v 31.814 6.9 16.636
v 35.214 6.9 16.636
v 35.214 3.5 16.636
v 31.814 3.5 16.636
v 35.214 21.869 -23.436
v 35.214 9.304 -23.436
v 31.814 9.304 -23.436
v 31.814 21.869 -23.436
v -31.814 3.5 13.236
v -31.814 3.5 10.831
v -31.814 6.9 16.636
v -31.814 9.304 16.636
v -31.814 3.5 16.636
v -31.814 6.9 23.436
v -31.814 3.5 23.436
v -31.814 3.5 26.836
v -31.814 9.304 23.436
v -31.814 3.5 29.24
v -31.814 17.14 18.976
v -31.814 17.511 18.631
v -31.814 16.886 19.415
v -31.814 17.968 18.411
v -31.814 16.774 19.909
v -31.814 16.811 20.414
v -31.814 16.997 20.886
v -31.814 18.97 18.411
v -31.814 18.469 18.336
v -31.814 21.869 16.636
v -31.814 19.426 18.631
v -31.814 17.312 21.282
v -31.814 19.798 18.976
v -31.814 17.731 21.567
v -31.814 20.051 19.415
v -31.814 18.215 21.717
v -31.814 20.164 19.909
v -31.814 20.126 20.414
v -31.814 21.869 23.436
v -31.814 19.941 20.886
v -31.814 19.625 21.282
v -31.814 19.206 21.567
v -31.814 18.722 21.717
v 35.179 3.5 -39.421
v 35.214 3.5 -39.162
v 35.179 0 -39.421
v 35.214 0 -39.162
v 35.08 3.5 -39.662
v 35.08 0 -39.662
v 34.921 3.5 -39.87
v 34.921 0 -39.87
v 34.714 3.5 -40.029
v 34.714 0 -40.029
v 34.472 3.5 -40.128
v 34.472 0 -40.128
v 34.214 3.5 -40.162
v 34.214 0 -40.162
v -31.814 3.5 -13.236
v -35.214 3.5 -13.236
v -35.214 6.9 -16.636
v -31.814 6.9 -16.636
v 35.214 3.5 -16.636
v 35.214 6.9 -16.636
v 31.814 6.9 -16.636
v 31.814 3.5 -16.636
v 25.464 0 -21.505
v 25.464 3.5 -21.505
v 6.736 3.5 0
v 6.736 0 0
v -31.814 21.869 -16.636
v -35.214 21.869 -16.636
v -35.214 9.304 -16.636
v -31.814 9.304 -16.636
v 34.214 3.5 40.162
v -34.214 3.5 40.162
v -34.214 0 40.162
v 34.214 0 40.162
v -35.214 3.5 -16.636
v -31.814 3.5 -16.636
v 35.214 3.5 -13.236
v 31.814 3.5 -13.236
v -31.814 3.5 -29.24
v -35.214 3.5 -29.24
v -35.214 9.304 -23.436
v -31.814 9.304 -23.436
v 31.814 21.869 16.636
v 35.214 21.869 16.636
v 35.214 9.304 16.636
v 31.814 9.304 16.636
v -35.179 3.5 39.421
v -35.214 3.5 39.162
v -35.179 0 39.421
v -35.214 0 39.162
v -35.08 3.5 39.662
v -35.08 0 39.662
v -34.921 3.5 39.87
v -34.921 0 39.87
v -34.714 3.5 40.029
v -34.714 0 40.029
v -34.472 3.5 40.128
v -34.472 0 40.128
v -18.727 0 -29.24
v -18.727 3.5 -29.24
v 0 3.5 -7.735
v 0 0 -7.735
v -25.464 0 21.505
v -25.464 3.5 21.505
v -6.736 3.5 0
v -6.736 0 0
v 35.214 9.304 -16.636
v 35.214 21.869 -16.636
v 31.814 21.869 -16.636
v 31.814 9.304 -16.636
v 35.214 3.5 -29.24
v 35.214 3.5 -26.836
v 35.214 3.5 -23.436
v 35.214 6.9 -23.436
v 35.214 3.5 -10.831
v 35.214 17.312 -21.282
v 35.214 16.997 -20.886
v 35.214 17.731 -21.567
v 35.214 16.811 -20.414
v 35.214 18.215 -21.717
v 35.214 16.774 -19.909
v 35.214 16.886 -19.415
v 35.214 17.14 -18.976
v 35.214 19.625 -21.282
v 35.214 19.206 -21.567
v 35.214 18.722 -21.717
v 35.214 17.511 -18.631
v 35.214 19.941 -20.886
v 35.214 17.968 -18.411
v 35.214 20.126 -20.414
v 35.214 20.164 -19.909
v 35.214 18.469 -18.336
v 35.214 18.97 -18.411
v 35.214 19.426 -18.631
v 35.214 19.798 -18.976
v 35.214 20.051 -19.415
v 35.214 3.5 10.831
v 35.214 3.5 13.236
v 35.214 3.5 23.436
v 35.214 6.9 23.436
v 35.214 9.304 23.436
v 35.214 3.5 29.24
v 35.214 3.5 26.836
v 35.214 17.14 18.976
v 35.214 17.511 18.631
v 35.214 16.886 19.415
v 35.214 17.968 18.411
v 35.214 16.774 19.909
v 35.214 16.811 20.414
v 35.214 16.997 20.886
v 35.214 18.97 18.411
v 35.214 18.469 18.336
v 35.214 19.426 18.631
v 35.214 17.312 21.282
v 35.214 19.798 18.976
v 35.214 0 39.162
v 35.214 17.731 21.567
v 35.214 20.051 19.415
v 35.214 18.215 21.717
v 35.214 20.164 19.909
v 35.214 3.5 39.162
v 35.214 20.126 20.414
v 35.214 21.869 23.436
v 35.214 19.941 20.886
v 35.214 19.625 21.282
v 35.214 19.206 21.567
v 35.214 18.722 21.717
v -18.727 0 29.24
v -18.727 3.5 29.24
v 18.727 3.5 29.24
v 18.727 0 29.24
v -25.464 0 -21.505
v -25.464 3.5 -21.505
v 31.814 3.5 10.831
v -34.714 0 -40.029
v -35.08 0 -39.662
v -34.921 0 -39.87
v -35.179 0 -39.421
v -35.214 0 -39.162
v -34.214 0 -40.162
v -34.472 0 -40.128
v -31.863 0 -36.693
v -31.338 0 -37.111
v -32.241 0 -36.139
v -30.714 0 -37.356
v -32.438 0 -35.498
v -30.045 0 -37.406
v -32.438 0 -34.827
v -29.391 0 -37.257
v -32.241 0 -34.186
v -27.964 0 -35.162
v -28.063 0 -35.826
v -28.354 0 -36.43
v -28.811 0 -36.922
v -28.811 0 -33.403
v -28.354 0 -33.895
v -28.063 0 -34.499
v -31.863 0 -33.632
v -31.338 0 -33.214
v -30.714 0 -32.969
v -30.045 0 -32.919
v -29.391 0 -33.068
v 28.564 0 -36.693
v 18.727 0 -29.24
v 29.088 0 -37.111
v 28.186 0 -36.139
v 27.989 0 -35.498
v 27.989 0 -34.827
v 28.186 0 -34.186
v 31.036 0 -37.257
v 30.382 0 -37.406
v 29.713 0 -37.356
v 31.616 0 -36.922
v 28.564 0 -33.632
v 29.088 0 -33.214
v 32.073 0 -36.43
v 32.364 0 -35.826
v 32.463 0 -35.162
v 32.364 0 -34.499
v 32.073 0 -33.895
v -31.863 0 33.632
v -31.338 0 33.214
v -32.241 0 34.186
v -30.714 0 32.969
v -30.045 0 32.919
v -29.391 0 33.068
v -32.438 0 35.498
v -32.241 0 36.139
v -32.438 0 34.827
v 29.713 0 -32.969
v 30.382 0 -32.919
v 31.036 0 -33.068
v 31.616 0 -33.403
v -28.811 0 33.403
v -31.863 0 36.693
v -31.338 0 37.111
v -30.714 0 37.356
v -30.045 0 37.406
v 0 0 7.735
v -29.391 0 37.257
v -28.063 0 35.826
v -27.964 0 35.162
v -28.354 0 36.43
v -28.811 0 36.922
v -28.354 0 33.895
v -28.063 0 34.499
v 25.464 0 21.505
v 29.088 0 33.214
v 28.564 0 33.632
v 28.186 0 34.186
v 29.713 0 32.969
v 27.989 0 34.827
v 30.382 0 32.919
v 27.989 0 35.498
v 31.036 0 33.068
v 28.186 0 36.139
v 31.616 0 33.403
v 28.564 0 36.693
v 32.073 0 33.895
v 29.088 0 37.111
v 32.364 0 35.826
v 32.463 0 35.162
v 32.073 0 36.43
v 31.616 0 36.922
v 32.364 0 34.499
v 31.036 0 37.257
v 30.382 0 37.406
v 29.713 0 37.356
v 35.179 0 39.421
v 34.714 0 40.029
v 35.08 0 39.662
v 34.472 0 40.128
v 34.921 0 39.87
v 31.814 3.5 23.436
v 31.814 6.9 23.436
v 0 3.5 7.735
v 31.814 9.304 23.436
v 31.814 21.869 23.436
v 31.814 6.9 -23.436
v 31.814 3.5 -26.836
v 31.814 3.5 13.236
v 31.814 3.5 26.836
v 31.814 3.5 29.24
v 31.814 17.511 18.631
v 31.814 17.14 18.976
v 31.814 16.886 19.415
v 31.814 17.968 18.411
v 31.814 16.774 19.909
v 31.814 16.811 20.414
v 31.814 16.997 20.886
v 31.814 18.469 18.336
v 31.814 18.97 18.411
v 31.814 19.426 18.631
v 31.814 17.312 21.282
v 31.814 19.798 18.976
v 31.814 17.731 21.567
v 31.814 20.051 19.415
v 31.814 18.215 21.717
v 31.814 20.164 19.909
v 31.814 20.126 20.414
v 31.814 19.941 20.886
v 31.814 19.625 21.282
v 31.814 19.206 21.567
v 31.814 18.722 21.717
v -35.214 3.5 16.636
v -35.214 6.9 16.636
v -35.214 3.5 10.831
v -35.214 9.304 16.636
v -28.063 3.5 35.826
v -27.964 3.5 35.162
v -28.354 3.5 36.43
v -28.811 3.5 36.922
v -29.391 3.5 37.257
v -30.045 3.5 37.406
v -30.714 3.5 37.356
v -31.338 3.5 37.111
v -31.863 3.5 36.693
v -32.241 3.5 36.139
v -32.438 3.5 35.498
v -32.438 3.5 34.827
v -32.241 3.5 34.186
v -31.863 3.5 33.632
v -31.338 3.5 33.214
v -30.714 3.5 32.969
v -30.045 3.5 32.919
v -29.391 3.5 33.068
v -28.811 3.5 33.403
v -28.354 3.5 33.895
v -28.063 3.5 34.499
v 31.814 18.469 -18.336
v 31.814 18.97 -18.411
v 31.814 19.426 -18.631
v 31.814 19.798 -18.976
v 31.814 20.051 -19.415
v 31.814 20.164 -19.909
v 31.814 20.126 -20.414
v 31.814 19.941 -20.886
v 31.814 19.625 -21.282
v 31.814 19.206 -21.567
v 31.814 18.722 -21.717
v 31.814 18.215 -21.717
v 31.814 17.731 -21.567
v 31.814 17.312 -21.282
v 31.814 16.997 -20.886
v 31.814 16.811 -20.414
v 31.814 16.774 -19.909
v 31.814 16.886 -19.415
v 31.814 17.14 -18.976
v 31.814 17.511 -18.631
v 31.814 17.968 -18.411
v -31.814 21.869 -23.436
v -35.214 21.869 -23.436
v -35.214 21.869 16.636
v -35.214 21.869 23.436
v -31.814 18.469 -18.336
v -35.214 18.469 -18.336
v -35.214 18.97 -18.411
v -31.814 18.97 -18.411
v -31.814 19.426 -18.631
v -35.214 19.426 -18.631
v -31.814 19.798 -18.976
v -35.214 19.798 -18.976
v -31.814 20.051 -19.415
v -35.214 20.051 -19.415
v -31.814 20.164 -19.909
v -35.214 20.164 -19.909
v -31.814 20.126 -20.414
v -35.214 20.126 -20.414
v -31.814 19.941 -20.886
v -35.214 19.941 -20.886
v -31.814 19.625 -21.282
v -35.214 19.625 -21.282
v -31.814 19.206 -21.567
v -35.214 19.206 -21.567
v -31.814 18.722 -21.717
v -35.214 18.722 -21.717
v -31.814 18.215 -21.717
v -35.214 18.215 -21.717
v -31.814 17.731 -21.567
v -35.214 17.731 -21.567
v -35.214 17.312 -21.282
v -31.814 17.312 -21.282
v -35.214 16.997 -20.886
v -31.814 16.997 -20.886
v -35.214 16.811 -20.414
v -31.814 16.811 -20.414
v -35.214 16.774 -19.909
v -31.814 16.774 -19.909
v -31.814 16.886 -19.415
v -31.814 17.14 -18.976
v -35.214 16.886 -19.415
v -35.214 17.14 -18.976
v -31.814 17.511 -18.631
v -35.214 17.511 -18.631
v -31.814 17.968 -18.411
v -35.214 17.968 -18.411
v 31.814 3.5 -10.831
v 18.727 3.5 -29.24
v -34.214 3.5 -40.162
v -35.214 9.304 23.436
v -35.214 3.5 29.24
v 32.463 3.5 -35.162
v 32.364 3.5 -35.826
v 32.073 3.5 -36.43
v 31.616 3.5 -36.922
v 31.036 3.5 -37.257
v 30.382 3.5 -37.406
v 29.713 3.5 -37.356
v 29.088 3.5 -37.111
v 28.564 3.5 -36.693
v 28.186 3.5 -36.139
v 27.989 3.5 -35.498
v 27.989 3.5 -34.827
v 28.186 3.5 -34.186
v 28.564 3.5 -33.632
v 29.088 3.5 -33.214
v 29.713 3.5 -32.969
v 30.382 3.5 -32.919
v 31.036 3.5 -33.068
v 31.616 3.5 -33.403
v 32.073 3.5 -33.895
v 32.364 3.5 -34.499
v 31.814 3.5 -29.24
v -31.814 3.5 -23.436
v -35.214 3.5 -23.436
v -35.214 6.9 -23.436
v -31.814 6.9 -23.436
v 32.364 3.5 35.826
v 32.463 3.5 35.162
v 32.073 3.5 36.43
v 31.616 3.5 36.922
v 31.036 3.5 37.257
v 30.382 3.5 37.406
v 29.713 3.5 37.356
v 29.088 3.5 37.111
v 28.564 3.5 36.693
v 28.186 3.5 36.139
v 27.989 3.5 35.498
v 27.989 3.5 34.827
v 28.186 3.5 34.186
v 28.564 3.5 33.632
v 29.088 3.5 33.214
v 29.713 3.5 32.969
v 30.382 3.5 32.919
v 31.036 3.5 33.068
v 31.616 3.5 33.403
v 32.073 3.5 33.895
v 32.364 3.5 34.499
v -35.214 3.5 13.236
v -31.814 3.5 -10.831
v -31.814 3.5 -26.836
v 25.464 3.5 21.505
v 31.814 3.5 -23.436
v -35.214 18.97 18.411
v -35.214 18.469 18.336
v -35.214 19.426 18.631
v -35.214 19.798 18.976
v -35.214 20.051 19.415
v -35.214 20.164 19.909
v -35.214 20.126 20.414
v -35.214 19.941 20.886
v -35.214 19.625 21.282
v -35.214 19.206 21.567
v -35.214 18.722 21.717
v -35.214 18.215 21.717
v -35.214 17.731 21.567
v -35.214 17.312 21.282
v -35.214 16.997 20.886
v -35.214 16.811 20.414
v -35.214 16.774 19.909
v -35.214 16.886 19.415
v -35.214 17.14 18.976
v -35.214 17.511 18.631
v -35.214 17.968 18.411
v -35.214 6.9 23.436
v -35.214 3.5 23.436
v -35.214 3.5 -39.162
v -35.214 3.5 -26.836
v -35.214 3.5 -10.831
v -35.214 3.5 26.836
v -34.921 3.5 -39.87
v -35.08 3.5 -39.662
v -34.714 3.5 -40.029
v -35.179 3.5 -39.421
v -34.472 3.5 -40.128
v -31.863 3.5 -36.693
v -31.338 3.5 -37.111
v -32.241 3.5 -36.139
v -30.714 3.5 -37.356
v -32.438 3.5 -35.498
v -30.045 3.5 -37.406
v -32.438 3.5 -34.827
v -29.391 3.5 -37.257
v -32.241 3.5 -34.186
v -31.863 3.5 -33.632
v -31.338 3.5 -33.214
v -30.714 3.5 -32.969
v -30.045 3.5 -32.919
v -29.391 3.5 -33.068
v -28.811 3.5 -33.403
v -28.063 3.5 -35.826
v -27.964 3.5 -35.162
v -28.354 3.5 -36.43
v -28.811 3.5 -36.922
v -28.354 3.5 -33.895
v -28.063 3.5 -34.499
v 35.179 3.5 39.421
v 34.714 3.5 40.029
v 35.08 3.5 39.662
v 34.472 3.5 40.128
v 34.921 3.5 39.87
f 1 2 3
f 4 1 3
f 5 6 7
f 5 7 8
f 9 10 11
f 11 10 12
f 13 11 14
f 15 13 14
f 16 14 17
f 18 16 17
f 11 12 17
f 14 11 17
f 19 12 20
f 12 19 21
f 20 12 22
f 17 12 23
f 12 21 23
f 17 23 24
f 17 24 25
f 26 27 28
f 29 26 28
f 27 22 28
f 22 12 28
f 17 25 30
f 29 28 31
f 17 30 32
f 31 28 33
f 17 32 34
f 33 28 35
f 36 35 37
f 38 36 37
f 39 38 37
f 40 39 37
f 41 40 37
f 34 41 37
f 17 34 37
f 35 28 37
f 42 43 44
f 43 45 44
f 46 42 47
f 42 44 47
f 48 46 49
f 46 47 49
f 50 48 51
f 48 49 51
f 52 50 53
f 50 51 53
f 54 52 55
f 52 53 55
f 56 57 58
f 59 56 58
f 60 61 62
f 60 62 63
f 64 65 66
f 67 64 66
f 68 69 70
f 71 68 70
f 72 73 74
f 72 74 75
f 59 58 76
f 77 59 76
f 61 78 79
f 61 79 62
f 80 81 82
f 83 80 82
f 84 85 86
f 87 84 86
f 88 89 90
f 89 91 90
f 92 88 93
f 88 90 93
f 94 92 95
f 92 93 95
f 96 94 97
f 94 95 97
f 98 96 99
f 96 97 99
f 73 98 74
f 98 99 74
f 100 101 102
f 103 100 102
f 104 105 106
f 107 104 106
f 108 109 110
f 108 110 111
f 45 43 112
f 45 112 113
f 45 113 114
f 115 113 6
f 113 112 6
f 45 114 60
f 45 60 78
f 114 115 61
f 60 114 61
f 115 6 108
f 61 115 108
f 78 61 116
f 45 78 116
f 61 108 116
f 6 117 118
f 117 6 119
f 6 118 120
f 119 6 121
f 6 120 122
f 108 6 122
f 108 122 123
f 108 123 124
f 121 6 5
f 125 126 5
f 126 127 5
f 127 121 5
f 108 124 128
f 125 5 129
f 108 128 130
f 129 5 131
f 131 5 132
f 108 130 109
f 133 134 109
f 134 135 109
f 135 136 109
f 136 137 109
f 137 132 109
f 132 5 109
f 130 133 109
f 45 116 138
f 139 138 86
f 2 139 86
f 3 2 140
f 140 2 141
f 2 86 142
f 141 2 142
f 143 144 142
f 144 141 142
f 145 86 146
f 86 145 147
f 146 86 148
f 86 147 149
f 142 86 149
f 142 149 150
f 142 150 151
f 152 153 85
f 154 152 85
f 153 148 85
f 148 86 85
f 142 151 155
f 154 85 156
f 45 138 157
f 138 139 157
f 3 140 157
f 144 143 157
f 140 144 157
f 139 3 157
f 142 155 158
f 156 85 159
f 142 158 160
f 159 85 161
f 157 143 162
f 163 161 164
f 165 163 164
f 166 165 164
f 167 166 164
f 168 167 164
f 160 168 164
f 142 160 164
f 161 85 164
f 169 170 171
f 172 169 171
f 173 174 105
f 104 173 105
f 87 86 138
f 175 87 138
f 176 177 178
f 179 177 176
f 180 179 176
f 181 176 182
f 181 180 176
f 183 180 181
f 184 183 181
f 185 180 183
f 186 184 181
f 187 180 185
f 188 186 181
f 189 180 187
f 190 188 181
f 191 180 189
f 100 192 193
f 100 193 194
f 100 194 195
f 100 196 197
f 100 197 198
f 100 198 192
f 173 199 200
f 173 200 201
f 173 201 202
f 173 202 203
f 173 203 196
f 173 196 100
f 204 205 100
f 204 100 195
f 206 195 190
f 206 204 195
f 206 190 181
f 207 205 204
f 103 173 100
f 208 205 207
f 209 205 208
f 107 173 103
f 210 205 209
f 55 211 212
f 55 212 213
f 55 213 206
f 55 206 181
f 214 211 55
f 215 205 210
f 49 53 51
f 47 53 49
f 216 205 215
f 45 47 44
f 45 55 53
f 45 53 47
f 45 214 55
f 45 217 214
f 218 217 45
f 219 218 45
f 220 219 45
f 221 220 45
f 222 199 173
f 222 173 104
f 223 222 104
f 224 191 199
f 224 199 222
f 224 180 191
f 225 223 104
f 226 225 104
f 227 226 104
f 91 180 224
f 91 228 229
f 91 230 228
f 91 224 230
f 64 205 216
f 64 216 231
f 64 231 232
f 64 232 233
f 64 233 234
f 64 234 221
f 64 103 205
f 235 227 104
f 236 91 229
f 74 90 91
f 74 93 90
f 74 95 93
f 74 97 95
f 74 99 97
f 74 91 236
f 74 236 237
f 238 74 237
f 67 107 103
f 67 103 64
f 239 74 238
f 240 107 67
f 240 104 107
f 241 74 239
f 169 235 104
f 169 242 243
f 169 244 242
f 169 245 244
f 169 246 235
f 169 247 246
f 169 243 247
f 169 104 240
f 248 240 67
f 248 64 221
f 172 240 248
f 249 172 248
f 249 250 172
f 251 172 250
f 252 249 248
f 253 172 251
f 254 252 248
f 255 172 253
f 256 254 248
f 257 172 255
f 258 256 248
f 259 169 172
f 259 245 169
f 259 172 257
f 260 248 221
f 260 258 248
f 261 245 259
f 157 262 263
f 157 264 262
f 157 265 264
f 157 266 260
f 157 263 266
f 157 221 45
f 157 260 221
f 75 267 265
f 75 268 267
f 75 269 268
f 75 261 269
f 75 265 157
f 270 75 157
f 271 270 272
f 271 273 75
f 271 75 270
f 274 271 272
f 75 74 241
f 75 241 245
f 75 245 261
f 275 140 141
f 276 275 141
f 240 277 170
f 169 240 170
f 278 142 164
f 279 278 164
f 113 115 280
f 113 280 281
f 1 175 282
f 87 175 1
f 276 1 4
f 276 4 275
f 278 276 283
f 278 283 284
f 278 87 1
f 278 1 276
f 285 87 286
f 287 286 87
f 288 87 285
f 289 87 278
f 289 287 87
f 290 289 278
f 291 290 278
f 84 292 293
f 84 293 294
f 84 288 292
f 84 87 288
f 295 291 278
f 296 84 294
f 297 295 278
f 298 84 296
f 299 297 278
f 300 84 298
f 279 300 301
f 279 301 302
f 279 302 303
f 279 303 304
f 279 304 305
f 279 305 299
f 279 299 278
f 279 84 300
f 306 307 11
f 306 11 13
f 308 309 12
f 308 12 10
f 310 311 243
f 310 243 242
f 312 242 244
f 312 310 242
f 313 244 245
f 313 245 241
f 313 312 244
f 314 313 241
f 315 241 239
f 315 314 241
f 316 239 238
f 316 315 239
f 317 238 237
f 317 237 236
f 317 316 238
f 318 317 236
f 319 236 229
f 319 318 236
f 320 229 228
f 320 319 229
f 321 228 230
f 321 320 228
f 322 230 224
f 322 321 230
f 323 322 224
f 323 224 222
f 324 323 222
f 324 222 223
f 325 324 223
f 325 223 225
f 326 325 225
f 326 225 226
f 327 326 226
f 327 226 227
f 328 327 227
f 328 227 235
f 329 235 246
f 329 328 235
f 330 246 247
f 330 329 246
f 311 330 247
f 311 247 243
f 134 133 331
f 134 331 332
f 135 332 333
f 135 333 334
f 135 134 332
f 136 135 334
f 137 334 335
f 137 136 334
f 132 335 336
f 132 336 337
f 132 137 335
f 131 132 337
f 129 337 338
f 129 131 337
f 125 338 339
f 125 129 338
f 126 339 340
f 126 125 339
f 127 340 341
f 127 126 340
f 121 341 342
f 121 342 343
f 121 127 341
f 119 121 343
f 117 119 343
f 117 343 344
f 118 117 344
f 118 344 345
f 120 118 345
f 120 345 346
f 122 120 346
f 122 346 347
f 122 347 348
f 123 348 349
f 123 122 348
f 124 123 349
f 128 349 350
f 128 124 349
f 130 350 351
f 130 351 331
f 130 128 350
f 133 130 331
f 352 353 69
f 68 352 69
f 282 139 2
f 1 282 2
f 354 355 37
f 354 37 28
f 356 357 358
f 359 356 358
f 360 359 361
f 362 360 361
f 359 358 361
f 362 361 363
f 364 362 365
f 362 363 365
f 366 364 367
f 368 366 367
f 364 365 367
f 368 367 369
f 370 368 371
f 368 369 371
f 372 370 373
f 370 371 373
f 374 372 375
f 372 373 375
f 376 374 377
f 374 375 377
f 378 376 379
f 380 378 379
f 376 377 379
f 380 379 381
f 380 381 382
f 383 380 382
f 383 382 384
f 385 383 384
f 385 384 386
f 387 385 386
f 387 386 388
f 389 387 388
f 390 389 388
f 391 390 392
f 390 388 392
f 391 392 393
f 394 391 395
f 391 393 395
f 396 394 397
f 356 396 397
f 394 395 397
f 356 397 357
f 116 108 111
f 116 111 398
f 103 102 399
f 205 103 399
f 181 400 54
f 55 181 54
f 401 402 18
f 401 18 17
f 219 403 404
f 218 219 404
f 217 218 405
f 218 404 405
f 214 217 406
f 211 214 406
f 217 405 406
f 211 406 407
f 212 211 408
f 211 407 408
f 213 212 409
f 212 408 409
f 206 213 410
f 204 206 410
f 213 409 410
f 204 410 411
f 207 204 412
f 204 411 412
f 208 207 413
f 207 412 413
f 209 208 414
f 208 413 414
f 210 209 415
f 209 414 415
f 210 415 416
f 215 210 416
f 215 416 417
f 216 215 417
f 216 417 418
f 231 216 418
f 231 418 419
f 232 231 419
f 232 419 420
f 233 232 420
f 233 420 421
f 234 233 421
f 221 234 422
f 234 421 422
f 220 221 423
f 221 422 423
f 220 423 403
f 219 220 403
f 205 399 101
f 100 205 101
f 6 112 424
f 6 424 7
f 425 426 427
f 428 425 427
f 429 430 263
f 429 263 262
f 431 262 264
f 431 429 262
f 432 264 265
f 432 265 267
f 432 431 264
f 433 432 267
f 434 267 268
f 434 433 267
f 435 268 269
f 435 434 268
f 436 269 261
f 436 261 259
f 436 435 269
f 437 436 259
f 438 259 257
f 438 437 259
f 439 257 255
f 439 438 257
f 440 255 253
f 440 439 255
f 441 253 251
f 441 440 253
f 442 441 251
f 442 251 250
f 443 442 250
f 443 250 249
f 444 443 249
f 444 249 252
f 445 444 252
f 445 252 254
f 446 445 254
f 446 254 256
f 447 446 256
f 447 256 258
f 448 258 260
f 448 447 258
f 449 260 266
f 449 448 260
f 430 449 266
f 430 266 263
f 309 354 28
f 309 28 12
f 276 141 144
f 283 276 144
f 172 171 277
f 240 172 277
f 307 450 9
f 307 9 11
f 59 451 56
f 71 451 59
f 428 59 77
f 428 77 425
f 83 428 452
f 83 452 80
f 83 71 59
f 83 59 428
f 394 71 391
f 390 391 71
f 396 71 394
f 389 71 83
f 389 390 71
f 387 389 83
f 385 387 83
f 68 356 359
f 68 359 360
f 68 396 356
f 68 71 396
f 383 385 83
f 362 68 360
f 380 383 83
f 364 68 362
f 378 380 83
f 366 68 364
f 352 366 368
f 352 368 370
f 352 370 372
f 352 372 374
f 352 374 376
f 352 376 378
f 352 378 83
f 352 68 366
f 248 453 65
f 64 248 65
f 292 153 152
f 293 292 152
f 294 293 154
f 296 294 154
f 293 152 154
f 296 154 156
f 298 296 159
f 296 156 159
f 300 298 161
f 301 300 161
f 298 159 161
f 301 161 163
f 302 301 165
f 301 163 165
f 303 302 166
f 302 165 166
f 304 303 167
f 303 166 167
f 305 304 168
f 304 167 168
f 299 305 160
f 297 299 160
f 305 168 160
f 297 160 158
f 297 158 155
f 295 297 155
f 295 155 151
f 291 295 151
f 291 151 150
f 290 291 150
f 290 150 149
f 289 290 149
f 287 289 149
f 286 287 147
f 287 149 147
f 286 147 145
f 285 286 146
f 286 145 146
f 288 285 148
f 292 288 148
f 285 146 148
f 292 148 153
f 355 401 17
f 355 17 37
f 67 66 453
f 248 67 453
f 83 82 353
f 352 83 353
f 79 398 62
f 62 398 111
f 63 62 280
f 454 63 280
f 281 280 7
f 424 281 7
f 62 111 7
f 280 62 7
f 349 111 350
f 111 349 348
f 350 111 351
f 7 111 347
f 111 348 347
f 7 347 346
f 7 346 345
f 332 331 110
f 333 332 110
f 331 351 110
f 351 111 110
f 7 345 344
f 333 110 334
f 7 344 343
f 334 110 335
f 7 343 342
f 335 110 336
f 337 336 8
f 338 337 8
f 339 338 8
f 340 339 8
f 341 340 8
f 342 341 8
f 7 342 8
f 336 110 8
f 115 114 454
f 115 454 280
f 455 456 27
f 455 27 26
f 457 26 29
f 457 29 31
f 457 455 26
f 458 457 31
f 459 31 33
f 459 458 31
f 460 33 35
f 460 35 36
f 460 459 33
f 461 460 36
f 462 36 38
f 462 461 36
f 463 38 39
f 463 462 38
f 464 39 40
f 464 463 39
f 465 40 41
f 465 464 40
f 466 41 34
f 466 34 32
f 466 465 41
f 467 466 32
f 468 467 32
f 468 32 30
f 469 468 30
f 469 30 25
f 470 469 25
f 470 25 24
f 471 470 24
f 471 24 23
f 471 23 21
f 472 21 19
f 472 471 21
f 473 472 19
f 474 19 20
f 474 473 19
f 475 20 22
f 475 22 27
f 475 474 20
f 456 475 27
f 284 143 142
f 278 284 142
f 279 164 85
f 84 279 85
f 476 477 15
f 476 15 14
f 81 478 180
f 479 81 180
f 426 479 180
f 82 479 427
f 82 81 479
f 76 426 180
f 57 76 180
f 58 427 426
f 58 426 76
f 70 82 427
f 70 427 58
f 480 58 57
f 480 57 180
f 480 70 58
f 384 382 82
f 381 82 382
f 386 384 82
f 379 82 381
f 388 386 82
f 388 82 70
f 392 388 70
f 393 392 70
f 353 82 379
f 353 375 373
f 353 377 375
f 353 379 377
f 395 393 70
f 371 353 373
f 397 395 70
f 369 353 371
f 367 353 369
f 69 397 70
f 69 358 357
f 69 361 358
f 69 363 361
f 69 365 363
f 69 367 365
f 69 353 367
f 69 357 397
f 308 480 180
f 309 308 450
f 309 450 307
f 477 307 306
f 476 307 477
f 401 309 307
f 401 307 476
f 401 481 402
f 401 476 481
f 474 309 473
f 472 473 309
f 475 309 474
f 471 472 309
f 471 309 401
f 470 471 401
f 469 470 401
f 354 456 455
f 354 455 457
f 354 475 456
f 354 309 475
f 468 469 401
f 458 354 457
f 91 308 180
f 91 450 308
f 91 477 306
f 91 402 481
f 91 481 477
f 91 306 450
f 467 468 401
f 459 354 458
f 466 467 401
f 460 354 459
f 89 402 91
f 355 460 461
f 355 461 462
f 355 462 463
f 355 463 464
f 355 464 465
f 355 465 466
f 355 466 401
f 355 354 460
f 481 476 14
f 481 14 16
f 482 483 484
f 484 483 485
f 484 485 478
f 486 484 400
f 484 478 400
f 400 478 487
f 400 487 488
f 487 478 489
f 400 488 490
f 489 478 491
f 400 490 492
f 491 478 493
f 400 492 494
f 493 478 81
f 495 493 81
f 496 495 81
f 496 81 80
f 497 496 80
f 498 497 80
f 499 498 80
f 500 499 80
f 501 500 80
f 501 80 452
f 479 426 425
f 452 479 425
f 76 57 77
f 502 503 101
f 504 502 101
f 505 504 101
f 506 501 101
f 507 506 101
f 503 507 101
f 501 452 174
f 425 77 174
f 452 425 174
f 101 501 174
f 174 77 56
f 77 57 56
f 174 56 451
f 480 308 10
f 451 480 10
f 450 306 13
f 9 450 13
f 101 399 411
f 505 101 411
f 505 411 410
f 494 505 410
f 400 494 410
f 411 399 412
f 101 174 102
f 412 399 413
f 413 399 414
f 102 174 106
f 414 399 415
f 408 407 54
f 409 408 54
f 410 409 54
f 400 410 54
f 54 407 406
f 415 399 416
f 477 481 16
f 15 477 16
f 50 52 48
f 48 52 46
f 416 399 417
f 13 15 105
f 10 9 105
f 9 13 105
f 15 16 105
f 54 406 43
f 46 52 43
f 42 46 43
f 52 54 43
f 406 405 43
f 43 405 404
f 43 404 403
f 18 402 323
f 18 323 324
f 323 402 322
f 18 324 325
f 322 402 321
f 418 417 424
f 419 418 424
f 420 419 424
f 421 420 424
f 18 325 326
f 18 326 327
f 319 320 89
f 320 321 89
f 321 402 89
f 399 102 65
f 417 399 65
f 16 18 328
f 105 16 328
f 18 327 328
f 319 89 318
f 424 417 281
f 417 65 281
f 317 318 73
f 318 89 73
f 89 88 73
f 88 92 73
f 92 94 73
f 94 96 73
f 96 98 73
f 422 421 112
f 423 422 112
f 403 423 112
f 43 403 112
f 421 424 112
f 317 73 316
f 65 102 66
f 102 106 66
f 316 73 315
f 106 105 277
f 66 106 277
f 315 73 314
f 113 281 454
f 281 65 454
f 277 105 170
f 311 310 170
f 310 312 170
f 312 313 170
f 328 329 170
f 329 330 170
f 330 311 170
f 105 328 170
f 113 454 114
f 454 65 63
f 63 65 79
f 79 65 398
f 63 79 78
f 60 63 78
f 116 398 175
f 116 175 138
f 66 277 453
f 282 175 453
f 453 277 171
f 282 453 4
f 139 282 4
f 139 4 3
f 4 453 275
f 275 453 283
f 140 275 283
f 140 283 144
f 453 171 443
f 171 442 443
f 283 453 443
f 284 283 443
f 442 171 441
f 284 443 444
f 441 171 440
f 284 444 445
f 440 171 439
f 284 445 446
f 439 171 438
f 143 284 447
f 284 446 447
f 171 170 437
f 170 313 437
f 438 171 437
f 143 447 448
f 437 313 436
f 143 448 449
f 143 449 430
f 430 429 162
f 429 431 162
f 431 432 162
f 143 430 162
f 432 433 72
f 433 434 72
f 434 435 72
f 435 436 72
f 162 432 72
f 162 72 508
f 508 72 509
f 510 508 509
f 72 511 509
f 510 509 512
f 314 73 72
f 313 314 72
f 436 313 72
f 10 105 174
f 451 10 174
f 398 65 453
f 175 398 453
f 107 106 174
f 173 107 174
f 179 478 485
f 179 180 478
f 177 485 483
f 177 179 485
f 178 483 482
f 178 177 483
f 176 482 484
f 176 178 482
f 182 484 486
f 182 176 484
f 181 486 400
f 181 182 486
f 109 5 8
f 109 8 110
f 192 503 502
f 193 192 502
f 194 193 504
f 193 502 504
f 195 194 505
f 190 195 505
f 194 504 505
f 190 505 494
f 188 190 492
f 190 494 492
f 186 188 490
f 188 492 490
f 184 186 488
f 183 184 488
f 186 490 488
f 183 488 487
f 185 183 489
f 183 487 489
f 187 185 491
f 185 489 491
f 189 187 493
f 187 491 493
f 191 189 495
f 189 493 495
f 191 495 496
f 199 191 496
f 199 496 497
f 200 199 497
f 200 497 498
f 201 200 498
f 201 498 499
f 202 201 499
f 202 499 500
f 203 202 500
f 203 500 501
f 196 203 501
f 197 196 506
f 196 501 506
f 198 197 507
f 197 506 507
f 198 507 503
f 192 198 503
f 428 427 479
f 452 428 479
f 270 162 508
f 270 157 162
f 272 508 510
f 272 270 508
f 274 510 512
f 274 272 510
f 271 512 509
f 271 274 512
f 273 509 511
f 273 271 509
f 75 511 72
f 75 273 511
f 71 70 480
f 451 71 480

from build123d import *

# Parameters (mm, degrees)
SKETCH1_W                                  = 70.427
SKETCH1_H                                  = 60.325
BOSS_EXTRUDE1_DEPTH                        = 3.5
SKETCH4_R                                  = 1.7
BOSS_EXTRUDE2_DEPTH                        = 3.4
MIRROR1_AT_THE_SECOND_PLANE_COPY_1_SKETC_R = 1.7
MIRROR1_AT_THE_SECOND_PLANE_COPY_1_DEPTH   = 3.4
SKETCH6_W                                  = 70.427
SKETCH6_H                                  = 10
SKETCH6_R                                  = 2.25
BOSS_EXTRUDE3_DEPTH                        = 3.5
FILLET1_R                                  = 1
CUT_EXTRUDE3_DEPTH                         = 19.368750112
CUT_EXTRUDE3_DEPTH_BACK                    = 4.5


with BuildPart() as part:
    # Sketch1 → Boss-Extrude1 (new body)
    with BuildSketch(Plane(origin=(0, 0, 0), x_dir=(1, 0, 0), z_dir=(0, 1, 0))):
        Rectangle(SKETCH1_W, SKETCH1_H)
    extrude(amount=BOSS_EXTRUDE1_DEPTH)

    # Sketch4 → Boss-Extrude2 (add)
    with BuildSketch(Plane.ZY.offset(35.2135)):
        Polygon((-29.239788056, 3.5), (-23.435625, 9.304163056), (-23.435625, 21.868750112), (-16.635625, 21.868750112), (-16.635625, 9.304163056), (-10.831461944, 3.5), (-13.235625, 3.5), (-16.635625, 6.9), (-16.635625, 3.5), (-23.435625, 3.5), (-23.435625, 6.9), (-26.835625, 3.5), align=None)
        with Locations((-20.035625, 18.468750112)):
            Circle(SKETCH4_R, mode=Mode.SUBTRACT)
    boss_extrude2 = extrude(amount=-BOSS_EXTRUDE2_DEPTH)

    # Mirror1: Boss-Extrude2 across plane
    add(boss_extrude2.mirror(Plane(origin=(0, 0, 0), x_dir=(0, 0, 1), z_dir=(1, 0, 0))))

    # Mirror1 at the second plane: Boss-Extrude2 across plane
    add(boss_extrude2.mirror(Plane(origin=(0, 0, 0), x_dir=(1, 0, 0), z_dir=(0, 0, -1))))

    # Mirror1 at the second plane copy 1 sketc → Mirror1 at the second plane copy 1 (add)
    with BuildSketch(Plane(origin=(35.2135, 0, 0), x_dir=(0, 0, -1), z_dir=(1, 0, 0))):
        Polygon((-29.239788056, 3.5), (-23.435625, 9.304163056), (-23.435625, 21.868750112), (-16.635625, 21.868750112), (-16.635625, 9.304163056), (-10.831461944, 3.5), (-13.235625, 3.5), (-16.635625, 6.9), (-16.635625, 3.5), (-23.435625, 3.5), (-23.435625, 6.9), (-26.835625, 3.5), align=None)
        with Locations((-20.035625, 18.468750112)):
            Circle(MIRROR1_AT_THE_SECOND_PLANE_COPY_1_SKETC_R, mode=Mode.SUBTRACT)
    extrude(amount=-MIRROR1_AT_THE_SECOND_PLANE_COPY_1_DEPTH)

    # Sketch6 → Boss-Extrude3 (add)
    with BuildSketch(Plane(origin=(0, 3.5, 0), x_dir=(1, 0, 0), z_dir=(0, 1, 0))):
        with Locations((0, 35.1625)):
            Rectangle(SKETCH6_W, SKETCH6_H)
        with Locations((-30.2135, 35.1625)):
            Circle(SKETCH6_R, mode=Mode.SUBTRACT)
        with Locations((30.2135, 35.1625)):
            Circle(SKETCH6_R, mode=Mode.SUBTRACT)
    boss_extrude3 = extrude(amount=-BOSS_EXTRUDE3_DEPTH)

    # Mirror2: Boss-Extrude3 across plane
    add(boss_extrude3.mirror(Plane.XY))

    # Fillet1
    fillet1_edges = [part.edges().sort_by_distance(p)[0] for p in [
        (-35.2135, 1.75, -40.1625),
        (35.2135, 1.75, -40.1625),
        (-35.2135, 1.75, 40.1625),
        (35.2135, 1.75, 40.1625),
    ]]
    fillet(fillet1_edges, radius=FILLET1_R)

    # Sketch7 → Cut-Extrude3 (cut, two sides)
    with BuildSketch(Plane(origin=(0, 3.5, 0), x_dir=(1, 0, 0), z_dir=(0, 1, 0))) as cut_extrude3_sk:
        Polygon((0, 7.735286309), (18.727217831, 29.239788056), (-18.727217831, 29.239788056), align=None)
        Polygon((25.4635, -21.504501748), (25.4635, 21.504501748), (6.736282169, 0), align=None)
        Polygon((-18.727217831, -29.239788056), (18.727217831, -29.239788056), (0, -7.735286309), align=None)
        Polygon((-6.736282169, 0), (-25.4635, 21.504501748), (-25.4635, -21.504501748), align=None)
    extrude(amount=CUT_EXTRUDE3_DEPTH, mode=Mode.SUBTRACT)
    extrude(cut_extrude3_sk.sketch, amount=-CUT_EXTRUDE3_DEPTH_BACK, mode=Mode.SUBTRACT)


solid = part.part
